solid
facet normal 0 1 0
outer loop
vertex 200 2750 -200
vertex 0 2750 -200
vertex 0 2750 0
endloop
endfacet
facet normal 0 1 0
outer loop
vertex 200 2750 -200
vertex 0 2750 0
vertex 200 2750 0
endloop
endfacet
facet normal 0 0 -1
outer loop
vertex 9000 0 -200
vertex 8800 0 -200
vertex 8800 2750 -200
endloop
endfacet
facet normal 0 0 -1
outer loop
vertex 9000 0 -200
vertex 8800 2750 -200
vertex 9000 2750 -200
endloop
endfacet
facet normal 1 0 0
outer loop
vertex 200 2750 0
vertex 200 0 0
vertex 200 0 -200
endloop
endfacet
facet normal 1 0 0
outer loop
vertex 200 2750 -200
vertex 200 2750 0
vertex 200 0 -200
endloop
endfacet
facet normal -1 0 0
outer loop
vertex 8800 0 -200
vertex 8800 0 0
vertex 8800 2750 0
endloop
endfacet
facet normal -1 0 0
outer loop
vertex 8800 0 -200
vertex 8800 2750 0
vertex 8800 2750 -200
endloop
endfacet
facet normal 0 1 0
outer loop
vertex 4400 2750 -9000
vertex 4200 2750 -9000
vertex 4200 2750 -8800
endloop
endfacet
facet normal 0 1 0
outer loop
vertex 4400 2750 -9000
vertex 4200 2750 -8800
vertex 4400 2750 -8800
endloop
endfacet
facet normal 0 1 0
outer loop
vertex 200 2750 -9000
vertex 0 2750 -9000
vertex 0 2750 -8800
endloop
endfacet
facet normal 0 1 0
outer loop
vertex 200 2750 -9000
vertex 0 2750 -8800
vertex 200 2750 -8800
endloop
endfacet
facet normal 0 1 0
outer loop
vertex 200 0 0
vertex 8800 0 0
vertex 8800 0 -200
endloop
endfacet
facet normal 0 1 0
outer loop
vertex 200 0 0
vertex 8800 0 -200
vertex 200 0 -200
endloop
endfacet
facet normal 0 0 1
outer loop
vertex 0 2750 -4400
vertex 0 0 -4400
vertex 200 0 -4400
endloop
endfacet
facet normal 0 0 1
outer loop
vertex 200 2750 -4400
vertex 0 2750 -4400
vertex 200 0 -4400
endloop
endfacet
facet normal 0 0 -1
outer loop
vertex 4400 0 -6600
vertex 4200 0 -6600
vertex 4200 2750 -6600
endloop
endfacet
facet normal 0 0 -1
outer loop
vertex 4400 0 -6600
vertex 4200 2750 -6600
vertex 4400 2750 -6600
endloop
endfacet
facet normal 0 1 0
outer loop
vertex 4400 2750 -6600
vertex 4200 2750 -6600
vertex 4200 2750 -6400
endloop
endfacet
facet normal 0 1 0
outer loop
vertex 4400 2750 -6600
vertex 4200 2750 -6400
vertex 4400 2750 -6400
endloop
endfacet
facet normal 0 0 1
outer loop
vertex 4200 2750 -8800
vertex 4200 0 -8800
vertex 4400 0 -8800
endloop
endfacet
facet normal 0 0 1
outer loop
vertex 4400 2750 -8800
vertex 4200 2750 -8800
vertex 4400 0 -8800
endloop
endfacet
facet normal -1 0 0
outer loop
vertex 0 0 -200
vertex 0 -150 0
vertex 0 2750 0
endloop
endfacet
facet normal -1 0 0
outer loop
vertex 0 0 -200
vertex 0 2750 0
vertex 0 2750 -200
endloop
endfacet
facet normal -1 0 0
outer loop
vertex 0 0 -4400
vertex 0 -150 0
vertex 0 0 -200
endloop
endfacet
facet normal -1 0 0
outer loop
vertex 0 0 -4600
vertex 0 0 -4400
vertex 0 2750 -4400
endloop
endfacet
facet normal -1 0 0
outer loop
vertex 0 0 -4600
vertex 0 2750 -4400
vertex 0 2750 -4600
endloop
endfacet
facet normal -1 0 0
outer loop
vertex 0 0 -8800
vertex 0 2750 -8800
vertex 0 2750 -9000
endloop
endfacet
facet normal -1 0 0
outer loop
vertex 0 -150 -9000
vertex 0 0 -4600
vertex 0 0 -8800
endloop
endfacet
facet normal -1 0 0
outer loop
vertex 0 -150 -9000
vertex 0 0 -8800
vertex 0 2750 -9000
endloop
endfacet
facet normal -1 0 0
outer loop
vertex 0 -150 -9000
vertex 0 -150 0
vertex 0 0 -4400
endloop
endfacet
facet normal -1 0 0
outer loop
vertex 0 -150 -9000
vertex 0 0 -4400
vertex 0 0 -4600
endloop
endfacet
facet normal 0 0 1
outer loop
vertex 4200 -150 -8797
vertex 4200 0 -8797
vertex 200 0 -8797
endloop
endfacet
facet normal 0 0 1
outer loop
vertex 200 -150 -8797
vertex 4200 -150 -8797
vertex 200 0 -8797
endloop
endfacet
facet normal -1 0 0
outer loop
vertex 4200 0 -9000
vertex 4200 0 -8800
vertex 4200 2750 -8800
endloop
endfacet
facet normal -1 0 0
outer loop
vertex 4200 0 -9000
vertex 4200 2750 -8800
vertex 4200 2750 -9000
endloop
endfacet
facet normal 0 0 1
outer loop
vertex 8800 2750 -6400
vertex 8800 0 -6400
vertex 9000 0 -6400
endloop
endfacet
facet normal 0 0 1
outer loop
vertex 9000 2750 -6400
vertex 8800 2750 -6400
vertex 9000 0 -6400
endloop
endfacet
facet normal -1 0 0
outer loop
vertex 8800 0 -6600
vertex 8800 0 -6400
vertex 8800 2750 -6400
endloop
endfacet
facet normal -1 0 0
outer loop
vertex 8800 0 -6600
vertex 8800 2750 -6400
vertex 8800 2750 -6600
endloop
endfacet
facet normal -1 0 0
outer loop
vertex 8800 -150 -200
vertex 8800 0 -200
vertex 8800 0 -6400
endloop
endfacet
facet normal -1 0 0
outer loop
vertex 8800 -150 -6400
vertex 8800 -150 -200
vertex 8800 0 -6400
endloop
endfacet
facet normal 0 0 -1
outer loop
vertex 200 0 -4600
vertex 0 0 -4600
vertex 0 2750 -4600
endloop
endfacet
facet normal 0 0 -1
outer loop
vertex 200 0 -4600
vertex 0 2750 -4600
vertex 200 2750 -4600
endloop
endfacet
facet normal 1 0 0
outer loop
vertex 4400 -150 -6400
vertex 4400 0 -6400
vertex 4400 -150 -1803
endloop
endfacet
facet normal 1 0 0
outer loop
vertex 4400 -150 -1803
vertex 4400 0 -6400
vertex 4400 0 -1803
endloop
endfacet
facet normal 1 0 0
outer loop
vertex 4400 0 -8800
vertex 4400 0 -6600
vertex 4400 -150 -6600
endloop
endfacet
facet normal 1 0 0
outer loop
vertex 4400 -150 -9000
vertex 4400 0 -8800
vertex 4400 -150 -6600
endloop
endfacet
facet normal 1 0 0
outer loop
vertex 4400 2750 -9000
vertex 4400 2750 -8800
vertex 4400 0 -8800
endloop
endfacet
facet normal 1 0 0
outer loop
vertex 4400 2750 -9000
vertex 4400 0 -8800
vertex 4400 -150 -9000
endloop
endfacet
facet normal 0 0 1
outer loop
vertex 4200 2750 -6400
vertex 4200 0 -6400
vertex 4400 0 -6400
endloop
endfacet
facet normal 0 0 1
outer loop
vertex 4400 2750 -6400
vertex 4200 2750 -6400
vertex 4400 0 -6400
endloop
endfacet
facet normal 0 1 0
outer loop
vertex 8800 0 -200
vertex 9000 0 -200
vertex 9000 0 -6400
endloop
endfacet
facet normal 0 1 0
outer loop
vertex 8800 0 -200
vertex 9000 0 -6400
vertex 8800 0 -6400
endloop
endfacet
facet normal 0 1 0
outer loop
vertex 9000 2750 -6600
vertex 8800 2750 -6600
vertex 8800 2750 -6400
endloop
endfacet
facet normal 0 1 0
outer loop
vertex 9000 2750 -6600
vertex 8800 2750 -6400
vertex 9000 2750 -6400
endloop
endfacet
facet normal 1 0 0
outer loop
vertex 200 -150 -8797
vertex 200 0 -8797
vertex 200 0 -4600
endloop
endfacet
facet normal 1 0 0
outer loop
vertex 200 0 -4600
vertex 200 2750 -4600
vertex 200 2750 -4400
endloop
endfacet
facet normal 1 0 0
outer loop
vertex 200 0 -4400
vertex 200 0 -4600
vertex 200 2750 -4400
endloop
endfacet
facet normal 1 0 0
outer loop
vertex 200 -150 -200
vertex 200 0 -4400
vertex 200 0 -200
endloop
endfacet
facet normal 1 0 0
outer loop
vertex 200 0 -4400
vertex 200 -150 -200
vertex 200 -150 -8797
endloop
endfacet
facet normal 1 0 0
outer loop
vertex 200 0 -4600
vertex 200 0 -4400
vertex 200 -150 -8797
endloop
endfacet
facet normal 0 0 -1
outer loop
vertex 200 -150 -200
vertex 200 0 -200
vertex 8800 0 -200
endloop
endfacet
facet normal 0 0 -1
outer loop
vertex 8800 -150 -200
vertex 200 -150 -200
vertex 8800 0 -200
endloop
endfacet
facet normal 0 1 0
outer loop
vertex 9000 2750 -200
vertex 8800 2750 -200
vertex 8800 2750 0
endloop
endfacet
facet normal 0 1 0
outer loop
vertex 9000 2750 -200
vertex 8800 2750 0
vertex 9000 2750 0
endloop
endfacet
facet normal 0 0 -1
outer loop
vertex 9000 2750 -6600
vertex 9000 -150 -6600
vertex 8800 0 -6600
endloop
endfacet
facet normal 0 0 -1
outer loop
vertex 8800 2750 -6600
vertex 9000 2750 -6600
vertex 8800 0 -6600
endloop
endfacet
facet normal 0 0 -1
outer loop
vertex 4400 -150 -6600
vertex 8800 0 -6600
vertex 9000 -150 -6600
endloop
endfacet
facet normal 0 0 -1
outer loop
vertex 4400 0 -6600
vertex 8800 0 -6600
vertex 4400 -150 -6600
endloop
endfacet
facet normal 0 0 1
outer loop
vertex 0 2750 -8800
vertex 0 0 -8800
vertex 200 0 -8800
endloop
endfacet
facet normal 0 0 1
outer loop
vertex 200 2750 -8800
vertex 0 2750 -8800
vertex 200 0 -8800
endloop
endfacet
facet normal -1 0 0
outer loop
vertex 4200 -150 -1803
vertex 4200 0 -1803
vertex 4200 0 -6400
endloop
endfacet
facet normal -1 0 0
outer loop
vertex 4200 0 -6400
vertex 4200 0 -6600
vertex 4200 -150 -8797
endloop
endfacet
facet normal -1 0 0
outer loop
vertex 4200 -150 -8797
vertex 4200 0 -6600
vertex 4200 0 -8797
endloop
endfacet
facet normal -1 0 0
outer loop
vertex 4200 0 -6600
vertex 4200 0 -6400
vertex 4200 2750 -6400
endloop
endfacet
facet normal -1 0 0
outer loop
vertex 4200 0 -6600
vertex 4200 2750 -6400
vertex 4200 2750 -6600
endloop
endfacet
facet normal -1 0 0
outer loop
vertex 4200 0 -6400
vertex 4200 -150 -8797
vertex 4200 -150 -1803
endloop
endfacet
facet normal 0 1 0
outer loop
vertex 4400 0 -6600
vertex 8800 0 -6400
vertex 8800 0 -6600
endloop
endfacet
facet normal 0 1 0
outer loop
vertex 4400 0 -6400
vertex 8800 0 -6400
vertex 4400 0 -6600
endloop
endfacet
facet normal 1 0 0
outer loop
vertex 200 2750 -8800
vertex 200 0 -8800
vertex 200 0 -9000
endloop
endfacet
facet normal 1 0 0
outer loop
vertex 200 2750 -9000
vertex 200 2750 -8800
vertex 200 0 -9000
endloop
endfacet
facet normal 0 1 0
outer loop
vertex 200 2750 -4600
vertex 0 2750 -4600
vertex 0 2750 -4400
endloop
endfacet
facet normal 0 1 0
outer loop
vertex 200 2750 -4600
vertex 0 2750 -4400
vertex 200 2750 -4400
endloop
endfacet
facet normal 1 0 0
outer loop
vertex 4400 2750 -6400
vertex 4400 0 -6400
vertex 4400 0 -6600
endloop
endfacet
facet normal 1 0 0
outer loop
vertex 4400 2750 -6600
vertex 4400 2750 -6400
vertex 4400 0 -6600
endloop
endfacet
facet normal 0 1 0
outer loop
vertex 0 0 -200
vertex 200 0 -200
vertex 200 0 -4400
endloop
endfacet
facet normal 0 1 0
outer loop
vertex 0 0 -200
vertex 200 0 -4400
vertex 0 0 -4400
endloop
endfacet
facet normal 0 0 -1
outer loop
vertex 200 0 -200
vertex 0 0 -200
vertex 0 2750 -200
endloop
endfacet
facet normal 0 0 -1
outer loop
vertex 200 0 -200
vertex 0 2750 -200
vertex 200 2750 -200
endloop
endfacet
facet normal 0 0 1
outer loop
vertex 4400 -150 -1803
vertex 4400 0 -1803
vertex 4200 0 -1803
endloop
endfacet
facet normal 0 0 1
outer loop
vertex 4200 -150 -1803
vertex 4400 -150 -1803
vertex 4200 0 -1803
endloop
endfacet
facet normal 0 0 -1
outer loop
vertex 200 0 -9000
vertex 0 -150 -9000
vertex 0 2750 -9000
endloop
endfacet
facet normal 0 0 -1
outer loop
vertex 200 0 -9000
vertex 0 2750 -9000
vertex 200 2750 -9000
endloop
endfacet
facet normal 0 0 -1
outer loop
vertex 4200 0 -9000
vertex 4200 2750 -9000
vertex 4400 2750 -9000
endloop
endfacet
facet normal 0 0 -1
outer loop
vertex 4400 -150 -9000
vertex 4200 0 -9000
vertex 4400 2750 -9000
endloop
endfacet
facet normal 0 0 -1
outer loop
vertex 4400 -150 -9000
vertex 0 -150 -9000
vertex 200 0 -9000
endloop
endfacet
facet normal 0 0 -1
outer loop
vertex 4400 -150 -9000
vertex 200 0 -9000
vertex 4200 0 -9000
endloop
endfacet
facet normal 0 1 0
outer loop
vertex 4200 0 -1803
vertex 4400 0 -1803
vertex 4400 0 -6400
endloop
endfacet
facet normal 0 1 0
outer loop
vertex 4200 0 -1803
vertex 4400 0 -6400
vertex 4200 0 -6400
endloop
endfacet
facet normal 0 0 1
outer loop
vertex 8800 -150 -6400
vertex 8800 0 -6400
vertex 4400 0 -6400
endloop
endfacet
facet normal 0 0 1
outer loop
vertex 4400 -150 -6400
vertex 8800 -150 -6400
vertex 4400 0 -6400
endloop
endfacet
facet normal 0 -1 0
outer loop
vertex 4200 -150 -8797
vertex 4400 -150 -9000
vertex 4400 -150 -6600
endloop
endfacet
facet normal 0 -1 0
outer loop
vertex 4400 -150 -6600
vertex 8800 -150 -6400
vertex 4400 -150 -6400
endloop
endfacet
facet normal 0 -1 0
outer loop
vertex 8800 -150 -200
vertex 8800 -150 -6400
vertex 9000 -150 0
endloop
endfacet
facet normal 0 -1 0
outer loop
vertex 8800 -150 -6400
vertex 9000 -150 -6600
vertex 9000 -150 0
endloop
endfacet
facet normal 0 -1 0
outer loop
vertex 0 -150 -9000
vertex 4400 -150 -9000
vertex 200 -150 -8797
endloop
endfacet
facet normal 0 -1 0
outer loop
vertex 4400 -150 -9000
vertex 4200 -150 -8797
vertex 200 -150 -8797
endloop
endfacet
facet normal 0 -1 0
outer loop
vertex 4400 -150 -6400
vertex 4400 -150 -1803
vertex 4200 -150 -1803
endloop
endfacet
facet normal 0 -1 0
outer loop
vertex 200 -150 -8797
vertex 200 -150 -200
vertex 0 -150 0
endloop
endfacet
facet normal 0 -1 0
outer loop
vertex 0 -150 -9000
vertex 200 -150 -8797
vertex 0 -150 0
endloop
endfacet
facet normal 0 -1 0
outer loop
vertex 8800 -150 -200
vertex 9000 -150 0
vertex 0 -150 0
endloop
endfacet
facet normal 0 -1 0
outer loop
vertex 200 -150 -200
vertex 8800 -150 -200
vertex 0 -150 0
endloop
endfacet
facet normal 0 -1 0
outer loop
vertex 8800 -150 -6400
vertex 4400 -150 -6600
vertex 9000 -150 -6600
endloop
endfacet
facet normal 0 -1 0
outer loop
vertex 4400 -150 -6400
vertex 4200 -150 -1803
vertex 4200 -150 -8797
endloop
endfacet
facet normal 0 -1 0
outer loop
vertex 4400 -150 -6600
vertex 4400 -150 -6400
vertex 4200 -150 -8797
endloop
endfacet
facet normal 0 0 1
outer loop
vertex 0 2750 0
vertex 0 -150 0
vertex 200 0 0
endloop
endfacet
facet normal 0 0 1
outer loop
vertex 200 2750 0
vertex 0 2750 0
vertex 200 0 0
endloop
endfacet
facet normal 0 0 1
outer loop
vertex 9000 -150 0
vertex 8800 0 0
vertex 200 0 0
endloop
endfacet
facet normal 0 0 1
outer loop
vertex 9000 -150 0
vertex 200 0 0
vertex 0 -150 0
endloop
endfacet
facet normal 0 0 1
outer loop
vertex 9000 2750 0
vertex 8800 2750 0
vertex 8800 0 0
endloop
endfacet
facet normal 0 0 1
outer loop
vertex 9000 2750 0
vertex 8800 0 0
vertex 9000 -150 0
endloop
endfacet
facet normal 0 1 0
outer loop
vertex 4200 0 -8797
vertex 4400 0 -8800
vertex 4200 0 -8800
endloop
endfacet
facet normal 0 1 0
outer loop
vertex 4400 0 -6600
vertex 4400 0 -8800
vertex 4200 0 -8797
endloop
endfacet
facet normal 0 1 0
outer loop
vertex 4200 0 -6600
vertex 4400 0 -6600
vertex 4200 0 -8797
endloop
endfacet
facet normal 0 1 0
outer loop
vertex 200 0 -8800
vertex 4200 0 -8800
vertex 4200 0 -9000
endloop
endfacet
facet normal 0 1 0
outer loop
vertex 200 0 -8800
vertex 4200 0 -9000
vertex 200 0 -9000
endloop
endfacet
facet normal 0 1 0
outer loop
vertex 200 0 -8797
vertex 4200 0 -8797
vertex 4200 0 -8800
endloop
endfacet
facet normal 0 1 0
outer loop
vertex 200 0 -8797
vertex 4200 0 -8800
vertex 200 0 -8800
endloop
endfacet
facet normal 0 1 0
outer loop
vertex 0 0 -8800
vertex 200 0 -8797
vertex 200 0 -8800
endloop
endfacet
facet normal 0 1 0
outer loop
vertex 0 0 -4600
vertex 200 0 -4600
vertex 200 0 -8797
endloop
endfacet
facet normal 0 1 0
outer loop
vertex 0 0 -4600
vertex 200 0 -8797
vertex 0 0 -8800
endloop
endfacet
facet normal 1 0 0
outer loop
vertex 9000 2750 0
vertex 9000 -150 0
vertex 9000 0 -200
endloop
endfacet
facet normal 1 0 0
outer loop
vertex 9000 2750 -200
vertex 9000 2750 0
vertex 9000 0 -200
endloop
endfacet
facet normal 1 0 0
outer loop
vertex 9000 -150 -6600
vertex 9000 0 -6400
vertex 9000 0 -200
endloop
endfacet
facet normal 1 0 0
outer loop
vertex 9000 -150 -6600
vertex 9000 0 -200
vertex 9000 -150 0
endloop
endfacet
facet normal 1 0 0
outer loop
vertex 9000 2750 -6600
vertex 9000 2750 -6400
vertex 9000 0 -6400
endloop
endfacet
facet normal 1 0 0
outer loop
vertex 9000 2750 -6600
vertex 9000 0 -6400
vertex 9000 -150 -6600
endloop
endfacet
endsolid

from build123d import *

# Parameters (mm, degrees)
EXTRUDE_1_DEPTH = 150
SKETCH_2_W      = 200
SKETCH_2_H      = 200
EXTRUDE_2_DEPTH = 2750


with BuildPart() as part:
    # Эскиз1 → Бобышка-Вытянуть1 (new body)
    with BuildSketch(Plane.XZ):
        Polygon((0, 0), (9000, 0), (9000, -6600), (4400, -6600), (4400, -9000), (0, -9000), align=None)
        Polygon((200, -200), (8800, -200), (8800, -6400), (4400, -6400), (4400, -1803), (4200, -1803), (4200, -8797), (200, -8797), align=None, mode=Mode.SUBTRACT)
    extrude(amount=EXTRUDE_1_DEPTH)

    # Эскиз2 → Бобышка-Вытянуть2 (add)
    with BuildSketch(Plane(origin=(0, 0, 0), x_dir=(1, 0, 0), z_dir=(0, 1, 0))):
        with Locations((100, 8900)):
            Rectangle(SKETCH_2_W, SKETCH_2_H)
        with Locations((4300, 8900)):
            Rectangle(SKETCH_2_W, SKETCH_2_H)
        with Locations((4300, 6500)):
            Rectangle(SKETCH_2_W, SKETCH_2_H)
        with Locations((8900, 6500)):
            Rectangle(SKETCH_2_W, SKETCH_2_H)
        with Locations((8900, 100)):
            Rectangle(SKETCH_2_W, SKETCH_2_H)
        with Locations((100, 100)):
            Rectangle(SKETCH_2_W, SKETCH_2_H)
        with Locations((100, 4500)):
            Rectangle(SKETCH_2_W, SKETCH_2_H)
    extrude(amount=EXTRUDE_2_DEPTH)


solid = part.part
